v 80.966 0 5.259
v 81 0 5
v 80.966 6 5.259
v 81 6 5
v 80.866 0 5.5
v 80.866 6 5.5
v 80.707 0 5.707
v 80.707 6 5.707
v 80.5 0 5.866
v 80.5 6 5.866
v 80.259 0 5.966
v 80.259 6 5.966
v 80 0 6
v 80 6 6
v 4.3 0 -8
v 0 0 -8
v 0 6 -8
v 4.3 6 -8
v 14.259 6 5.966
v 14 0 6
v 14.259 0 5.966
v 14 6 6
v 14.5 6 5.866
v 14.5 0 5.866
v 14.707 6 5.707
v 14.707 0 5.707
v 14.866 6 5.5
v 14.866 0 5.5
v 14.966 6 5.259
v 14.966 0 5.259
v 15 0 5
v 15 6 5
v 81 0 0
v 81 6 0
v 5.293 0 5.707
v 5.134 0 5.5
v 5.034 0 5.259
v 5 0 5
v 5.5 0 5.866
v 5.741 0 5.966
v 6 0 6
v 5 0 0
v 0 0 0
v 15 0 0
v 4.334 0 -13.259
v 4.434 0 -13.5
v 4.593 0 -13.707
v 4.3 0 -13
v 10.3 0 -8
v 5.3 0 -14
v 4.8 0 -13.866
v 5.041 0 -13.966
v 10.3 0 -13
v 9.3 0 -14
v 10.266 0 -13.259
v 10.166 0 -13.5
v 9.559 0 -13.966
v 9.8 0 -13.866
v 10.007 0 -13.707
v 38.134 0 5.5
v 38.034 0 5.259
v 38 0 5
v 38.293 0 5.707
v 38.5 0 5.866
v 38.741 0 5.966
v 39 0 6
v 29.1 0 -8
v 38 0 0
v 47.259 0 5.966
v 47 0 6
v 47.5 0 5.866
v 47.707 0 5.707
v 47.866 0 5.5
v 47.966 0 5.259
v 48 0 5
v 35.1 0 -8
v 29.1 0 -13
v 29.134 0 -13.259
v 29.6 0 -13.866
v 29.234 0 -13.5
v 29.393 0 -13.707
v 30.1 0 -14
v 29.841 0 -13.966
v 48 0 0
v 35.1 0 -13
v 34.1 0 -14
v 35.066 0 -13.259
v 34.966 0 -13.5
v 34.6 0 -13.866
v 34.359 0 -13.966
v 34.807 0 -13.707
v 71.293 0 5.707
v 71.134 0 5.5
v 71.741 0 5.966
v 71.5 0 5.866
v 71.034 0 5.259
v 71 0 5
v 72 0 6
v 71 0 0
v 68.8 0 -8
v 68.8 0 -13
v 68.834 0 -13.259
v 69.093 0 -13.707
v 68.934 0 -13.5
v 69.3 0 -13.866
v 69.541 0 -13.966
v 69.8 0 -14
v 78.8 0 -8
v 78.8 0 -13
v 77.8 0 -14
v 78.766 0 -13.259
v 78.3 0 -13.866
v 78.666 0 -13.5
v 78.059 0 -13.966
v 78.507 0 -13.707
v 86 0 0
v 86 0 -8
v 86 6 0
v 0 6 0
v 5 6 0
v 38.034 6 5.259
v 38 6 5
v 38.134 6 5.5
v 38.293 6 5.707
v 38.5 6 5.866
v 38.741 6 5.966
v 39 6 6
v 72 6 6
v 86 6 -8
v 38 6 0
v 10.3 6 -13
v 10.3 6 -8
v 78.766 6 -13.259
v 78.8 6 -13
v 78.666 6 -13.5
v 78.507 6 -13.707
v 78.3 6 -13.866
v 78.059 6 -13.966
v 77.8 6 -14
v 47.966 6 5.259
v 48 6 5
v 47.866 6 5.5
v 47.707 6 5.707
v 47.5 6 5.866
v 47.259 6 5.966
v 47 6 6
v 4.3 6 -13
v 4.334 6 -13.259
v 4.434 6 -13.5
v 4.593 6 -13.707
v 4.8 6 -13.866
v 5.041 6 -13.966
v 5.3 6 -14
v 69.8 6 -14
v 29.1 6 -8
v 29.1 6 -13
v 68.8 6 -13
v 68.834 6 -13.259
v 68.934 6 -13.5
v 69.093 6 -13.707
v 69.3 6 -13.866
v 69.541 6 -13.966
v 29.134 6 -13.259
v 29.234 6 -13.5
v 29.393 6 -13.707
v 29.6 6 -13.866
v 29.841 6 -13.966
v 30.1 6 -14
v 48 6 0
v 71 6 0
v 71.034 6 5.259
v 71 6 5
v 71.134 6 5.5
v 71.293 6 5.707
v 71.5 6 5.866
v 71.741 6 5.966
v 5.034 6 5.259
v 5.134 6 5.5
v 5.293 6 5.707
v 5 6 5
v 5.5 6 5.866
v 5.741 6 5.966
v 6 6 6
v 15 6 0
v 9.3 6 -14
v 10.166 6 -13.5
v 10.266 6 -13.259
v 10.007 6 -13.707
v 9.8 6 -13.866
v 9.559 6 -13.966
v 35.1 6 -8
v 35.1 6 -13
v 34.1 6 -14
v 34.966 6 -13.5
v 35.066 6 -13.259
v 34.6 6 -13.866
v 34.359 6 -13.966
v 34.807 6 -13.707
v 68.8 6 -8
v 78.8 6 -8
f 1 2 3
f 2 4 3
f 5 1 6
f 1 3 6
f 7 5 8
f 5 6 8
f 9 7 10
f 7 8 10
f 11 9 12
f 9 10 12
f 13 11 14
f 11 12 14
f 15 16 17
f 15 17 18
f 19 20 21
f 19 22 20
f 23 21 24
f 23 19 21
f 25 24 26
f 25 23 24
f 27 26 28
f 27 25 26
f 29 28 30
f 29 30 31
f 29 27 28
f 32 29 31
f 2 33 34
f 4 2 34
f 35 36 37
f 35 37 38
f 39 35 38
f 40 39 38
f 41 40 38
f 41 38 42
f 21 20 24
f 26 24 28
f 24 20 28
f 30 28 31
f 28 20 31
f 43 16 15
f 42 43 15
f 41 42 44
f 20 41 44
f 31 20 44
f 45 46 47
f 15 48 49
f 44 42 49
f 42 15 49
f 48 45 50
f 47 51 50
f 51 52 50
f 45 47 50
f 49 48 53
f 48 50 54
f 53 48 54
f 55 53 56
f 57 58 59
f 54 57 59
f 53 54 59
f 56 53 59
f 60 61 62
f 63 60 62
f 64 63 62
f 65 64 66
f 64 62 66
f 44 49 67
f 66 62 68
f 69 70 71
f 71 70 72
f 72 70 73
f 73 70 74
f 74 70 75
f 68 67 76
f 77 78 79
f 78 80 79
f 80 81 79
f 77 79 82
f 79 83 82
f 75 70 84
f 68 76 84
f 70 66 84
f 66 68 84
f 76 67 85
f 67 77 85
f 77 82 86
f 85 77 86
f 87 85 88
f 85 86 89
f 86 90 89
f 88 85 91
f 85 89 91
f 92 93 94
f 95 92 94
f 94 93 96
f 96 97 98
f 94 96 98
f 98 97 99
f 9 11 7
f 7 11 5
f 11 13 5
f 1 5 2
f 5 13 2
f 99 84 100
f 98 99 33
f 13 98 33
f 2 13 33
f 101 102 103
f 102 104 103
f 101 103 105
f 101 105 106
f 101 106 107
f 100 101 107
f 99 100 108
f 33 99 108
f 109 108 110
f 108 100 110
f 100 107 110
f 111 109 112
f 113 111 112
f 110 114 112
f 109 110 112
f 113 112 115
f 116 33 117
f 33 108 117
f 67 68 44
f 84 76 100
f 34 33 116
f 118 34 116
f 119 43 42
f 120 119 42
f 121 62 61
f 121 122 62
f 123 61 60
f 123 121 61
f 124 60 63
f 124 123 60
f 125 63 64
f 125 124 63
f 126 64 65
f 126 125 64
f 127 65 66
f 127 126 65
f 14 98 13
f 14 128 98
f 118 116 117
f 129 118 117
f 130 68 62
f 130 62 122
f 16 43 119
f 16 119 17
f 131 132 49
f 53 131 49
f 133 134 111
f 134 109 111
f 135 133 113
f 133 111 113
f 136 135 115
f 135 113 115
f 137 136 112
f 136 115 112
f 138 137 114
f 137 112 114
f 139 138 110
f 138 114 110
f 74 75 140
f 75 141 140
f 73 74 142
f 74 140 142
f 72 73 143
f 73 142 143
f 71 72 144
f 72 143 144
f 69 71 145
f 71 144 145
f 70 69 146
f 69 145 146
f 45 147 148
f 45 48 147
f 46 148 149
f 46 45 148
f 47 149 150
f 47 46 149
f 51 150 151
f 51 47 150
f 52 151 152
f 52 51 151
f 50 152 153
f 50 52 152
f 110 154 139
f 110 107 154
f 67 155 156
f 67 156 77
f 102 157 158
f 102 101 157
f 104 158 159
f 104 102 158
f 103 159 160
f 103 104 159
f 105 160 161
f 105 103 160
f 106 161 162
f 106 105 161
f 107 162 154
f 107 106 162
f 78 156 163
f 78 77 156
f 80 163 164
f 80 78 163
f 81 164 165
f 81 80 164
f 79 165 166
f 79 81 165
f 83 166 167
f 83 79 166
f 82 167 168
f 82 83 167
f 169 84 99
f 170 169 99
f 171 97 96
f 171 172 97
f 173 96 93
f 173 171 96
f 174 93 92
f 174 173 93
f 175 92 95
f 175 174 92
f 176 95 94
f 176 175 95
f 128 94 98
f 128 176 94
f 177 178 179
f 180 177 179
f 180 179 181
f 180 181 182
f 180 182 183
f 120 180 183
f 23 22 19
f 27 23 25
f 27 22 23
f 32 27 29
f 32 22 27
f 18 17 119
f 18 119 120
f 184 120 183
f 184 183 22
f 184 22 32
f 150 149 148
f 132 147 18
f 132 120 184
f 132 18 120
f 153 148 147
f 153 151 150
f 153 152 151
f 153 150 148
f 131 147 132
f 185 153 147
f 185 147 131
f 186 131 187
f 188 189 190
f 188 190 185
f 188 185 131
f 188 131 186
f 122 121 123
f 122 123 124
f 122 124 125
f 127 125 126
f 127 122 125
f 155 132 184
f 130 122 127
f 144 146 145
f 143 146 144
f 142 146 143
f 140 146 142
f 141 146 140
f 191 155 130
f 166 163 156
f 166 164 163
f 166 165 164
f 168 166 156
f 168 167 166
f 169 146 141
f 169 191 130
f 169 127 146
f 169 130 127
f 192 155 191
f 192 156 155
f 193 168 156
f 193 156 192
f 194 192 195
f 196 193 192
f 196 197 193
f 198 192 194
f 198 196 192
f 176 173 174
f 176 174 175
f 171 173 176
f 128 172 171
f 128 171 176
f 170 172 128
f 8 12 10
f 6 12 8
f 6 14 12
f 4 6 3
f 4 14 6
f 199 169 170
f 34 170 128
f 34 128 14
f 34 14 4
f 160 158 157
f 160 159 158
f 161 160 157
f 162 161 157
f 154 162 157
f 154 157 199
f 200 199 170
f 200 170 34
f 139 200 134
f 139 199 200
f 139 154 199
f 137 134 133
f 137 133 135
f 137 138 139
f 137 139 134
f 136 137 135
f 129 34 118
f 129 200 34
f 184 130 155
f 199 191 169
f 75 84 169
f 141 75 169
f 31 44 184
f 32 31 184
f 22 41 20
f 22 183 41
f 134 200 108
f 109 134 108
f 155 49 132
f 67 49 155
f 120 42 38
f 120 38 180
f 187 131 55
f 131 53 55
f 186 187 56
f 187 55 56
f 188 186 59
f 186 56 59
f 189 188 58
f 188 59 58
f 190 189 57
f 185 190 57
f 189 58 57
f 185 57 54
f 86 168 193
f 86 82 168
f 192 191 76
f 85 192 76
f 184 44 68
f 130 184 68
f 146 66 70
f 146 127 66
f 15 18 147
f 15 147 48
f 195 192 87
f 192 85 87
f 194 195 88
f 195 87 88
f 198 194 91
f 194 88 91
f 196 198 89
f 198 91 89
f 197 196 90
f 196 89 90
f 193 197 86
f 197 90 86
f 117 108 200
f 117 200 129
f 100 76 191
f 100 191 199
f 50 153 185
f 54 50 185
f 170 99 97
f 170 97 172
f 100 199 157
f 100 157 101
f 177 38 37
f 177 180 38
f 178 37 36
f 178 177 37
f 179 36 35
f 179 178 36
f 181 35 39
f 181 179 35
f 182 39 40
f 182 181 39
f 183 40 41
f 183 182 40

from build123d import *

# Parameters (mm, degrees)
SKETCH1_W               = 86
SKETCH1_H               = 8
BOSS_EXTRUDE1_DEPTH     = 6
SKETCH234_W             = 10
SKETCH234_H             = 6
BOSS_EXTRUDE234_DEPTH   = 6
FILLET134_R             = 1
SKETCH2341_W            = 10
SKETCH2341_H            = 6
BOSS_EXTRUDE2341_DEPTH  = 6
FILLET1341_R            = 1
SKETCH2342_W            = 10
SKETCH2342_H            = 6
BOSS_EXTRUDE2342_DEPTH  = 6
FILLET1342_R            = 1
SKETCH2343_W            = 10
SKETCH2343_H            = 6
BOSS_EXTRUDE2343_DEPTH  = 6
FILLET1343_R            = 1
SKETCH2348_W            = 6
SKETCH2348_H            = 6
BOSS_EXTRUDE2348_DEPTH  = 6
FILLET1348_R            = 1
SKETCH23410_W           = 6
SKETCH23410_H           = 6
BOSS_EXTRUDE23410_DEPTH = 6
FILLET13410_R           = 1


with BuildPart() as part:
    # Sketch1 → Boss-Extrude1 (new body)
    with BuildSketch(Plane(origin=(0, 0, 0), x_dir=(1, 0, 0), z_dir=(0, 1, 0))):
        with Locations((43, 4)):
            Rectangle(SKETCH1_W, SKETCH1_H)
    extrude(amount=BOSS_EXTRUDE1_DEPTH)

    # Sketch234 → Boss-Extrude234 (add)
    with BuildSketch(Plane(origin=(9.232221392, 0, 0), x_dir=(1, 0, 0), z_dir=(0, 0, 1))):
        with Locations((0.767778608, 3)):
            Rectangle(SKETCH234_W, SKETCH234_H)
    extrude(amount=BOSS_EXTRUDE234_DEPTH)

    # Fillet134
    fillet134_edges = [part.edges().sort_by_distance(p)[0] for p in [
        (5, 3, 6),
        (15, 3, 6),
    ]]
    fillet(fillet134_edges, radius=FILLET134_R)

    # Sketch2341 → Boss-Extrude2341 (add)
    with BuildSketch(Plane(origin=(42.232221392, 0, 0), x_dir=(1, 0, 0), z_dir=(0, 0, 1))):
        with Locations((0.767778608, 3)):
            Rectangle(SKETCH2341_W, SKETCH2341_H)
    extrude(amount=BOSS_EXTRUDE2341_DEPTH)

    # Fillet1341
    fillet1341_edges = [part.edges().sort_by_distance(p)[0] for p in [
        (48, 3, 6),
        (38, 3, 6),
    ]]
    fillet(fillet1341_edges, radius=FILLET1341_R)

    # Sketch2342 → Boss-Extrude2342 (add)
    with BuildSketch(Plane(origin=(75.232221392, 0, 0), x_dir=(1, 0, 0), z_dir=(0, 0, 1))):
        with Locations((0.767778608, 3)):
            Rectangle(SKETCH2342_W, SKETCH2342_H)
    extrude(amount=BOSS_EXTRUDE2342_DEPTH)

    # Fillet1342
    fillet1342_edges = [part.edges().sort_by_distance(p)[0] for p in [
        (81, 3, 6),
        (71, 3, 6),
    ]]
    fillet(fillet1342_edges, radius=FILLET1342_R)

    # Sketch2343 → Boss-Extrude2343 (add)
    with BuildSketch(Plane(origin=(73.032221392, 6, -8), x_dir=(1, 0, 0), z_dir=(0, 0, -1))):
        with Locations((0.767778608, 3)):
            Rectangle(SKETCH2343_W, SKETCH2343_H)
    extrude(amount=BOSS_EXTRUDE2343_DEPTH)

    # Fillet1343
    fillet1343_edges = [part.edges().sort_by_distance(p)[0] for p in [
        (68.8, 3, -14),
        (78.8, 3, -14),
    ]]
    fillet(fillet1343_edges, radius=FILLET1343_R)

    # Sketch2348 → Boss-Extrude2348 (add)
    with BuildSketch(Plane(origin=(31.332221392, 6, -8), x_dir=(1, 0, 0), z_dir=(0, 0, -1))):
        with Locations((0.767778608, 3)):
            Rectangle(SKETCH2348_W, SKETCH2348_H)
    extrude(amount=BOSS_EXTRUDE2348_DEPTH)

    # Fillet1348
    fillet1348_edges = [part.edges().sort_by_distance(p)[0] for p in [
        (35.1, 3, -14),
        (29.1, 3, -14),
    ]]
    fillet(fillet1348_edges, radius=FILLET1348_R)

    # Sketch23410 → Boss-Extrude23410 (add)
    with BuildSketch(Plane(origin=(6.532221392, 6, -8), x_dir=(1, 0, 0), z_dir=(0, 0, -1))):
        with Locations((0.767778608, 3)):
            Rectangle(SKETCH23410_W, SKETCH23410_H)
    extrude(amount=BOSS_EXTRUDE23410_DEPTH)

    # Fillet13410
    fillet13410_edges = [part.edges().sort_by_distance(p)[0] for p in [
        (10.3, 3, -14),
        (4.3, 3, -14),
    ]]
    fillet(fillet13410_edges, radius=FILLET13410_R)


solid = part.part
